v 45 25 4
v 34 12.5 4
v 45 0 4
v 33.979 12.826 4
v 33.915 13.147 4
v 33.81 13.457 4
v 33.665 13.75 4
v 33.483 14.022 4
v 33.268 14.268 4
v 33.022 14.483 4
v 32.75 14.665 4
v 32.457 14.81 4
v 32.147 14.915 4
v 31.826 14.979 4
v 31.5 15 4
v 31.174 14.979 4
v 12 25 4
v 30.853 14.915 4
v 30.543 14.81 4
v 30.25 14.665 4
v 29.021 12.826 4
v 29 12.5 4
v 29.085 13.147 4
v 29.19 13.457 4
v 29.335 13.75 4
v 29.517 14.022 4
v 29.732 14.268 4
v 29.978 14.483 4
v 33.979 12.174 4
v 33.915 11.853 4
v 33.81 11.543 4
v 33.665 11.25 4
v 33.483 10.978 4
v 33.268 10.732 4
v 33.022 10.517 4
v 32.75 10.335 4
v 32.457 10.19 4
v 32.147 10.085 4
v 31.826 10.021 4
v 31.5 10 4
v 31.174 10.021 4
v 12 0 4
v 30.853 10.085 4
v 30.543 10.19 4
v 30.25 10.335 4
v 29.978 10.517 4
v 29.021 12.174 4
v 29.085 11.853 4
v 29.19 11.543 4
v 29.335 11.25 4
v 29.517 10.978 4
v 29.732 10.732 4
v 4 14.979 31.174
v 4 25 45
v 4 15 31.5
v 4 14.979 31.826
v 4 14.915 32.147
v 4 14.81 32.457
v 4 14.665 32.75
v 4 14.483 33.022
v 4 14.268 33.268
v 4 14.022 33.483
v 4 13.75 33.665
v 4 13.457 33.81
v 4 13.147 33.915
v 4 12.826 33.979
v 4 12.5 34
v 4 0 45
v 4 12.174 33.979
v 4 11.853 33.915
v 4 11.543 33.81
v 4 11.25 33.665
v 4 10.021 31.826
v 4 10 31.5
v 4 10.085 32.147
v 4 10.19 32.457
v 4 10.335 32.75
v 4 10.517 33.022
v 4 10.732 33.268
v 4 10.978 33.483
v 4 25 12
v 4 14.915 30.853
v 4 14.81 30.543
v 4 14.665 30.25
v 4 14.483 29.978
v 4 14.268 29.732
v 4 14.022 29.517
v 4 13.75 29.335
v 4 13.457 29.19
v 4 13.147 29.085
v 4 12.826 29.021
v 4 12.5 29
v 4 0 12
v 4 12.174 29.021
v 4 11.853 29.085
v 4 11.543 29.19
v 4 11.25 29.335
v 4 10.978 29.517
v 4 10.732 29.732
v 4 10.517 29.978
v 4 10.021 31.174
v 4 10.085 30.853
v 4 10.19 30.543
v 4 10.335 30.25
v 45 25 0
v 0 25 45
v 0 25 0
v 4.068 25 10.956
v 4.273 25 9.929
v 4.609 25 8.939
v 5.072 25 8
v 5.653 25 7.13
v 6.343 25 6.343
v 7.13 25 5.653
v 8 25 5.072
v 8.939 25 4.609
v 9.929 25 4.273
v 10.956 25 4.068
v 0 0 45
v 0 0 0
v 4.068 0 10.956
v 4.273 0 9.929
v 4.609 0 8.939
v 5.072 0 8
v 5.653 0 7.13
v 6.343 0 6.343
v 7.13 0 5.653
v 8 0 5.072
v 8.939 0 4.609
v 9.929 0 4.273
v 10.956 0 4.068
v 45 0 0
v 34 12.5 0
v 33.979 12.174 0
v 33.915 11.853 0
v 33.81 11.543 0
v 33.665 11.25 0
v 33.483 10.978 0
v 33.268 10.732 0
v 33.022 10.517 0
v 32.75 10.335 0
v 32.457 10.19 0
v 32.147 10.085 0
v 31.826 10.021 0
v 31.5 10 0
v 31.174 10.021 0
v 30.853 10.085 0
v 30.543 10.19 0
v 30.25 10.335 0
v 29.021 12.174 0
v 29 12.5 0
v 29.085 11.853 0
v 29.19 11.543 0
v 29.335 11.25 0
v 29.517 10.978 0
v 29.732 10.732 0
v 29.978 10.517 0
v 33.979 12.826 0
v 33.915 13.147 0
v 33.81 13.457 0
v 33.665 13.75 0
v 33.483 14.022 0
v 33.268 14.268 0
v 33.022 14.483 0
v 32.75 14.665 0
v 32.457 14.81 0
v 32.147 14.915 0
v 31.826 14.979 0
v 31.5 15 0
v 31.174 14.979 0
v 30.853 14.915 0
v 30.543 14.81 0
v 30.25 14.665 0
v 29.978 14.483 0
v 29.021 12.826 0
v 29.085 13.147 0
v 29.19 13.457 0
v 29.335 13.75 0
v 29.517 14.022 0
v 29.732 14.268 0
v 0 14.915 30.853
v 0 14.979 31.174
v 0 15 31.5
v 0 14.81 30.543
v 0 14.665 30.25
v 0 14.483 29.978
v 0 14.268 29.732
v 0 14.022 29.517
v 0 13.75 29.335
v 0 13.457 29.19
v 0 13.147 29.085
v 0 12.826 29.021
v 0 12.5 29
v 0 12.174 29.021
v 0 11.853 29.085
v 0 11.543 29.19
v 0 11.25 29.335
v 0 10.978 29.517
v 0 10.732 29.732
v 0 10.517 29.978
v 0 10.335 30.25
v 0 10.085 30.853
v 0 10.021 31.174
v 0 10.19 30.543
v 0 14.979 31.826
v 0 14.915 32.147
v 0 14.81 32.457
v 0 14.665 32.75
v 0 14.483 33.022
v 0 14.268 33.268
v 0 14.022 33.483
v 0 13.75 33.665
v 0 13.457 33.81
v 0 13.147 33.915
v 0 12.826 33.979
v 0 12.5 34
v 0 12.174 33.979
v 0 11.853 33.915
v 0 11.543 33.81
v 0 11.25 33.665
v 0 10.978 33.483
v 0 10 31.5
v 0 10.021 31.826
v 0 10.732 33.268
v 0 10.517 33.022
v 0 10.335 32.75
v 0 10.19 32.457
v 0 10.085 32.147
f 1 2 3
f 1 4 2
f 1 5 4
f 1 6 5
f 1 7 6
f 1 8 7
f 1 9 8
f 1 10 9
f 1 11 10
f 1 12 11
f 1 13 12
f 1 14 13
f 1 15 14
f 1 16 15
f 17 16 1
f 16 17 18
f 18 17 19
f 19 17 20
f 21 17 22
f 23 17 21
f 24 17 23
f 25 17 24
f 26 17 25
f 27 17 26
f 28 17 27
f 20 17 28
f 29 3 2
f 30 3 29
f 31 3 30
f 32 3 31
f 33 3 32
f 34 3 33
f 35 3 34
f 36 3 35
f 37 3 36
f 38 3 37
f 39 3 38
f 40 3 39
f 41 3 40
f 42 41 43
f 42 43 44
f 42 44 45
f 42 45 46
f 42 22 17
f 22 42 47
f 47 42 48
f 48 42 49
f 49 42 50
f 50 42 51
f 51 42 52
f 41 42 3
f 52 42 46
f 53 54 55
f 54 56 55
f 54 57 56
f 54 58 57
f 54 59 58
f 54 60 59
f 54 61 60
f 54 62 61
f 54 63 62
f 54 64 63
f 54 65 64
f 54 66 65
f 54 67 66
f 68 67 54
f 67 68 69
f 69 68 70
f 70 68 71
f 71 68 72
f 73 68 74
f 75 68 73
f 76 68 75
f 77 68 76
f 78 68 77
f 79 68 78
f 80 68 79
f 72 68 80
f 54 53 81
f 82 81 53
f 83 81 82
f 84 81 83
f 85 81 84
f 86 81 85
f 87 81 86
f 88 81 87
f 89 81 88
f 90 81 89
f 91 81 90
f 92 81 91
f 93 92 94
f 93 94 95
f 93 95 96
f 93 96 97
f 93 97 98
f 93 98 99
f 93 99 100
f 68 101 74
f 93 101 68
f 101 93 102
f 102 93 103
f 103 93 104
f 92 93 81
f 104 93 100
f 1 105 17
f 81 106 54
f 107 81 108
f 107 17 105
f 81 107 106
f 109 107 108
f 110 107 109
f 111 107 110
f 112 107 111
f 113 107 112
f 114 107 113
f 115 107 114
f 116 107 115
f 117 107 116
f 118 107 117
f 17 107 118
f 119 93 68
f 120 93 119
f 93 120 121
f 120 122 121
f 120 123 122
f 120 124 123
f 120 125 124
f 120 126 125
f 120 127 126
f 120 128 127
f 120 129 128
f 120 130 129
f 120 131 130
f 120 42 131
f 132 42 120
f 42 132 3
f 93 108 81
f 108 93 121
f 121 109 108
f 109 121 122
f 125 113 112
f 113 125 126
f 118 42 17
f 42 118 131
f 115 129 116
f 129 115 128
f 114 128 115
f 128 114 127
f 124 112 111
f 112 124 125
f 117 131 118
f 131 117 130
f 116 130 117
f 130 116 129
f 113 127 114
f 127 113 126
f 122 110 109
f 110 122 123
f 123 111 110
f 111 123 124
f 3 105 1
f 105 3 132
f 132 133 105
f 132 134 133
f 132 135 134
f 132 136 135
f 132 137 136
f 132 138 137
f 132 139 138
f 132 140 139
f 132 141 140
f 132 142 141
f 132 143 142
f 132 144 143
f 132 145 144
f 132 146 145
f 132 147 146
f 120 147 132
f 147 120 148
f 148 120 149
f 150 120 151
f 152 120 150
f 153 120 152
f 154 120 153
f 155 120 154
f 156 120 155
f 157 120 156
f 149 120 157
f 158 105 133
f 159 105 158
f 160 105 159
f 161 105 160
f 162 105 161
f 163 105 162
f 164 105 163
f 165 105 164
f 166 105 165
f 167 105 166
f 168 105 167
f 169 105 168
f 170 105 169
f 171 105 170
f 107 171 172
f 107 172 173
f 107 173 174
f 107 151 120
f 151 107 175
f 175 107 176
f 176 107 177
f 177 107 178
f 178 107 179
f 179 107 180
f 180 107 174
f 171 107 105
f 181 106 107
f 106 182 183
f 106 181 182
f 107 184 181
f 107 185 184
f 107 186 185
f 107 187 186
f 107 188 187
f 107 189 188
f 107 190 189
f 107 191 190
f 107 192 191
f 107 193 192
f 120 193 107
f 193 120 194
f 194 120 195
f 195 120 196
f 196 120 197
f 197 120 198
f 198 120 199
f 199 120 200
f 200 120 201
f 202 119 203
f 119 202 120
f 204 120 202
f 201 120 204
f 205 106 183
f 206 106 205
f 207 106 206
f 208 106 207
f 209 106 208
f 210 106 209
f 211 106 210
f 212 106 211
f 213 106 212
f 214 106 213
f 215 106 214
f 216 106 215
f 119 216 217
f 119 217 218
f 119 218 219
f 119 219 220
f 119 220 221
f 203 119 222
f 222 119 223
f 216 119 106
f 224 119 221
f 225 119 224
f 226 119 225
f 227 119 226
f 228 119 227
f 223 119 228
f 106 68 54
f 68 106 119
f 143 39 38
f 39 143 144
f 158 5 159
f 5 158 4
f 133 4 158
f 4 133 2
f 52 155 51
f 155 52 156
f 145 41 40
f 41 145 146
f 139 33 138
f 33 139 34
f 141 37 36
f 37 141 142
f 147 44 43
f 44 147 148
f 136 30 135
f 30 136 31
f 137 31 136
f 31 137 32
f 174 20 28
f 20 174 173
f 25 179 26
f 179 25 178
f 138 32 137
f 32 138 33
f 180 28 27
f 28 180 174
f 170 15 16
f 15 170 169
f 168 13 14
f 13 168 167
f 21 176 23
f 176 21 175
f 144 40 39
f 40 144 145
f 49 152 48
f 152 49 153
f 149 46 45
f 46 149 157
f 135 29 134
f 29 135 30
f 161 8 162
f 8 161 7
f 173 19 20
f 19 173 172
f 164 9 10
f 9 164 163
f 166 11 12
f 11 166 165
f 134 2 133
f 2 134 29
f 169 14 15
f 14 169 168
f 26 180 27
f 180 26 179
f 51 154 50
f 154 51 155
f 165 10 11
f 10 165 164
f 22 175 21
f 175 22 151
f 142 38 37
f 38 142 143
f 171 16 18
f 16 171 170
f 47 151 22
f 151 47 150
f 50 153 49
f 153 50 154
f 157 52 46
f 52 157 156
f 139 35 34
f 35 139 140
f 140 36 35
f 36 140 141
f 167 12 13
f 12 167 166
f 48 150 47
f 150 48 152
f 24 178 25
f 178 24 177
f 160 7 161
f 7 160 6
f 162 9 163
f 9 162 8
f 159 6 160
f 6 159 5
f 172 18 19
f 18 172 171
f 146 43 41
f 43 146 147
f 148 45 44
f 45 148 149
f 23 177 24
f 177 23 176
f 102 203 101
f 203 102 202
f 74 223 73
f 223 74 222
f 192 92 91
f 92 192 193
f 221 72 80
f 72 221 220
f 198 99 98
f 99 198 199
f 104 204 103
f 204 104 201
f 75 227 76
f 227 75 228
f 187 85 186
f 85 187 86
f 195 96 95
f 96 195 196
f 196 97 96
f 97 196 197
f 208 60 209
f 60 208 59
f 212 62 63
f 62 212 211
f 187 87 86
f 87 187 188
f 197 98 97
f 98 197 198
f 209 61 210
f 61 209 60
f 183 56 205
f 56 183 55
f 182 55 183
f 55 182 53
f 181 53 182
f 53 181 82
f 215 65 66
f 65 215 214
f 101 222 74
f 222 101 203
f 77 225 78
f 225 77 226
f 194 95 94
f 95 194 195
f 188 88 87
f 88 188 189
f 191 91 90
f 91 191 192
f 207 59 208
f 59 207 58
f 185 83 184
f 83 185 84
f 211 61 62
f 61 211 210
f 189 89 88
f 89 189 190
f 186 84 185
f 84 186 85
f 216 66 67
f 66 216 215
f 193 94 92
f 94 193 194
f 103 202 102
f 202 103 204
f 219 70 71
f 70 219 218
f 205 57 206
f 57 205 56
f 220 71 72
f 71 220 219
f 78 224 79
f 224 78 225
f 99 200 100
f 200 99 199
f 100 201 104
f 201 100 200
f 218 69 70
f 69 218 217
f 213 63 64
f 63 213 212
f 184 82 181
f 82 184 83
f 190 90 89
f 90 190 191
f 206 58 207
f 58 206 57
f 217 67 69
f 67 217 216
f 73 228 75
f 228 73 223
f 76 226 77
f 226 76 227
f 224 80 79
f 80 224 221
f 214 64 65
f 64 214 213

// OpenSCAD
// Filleted angle bracket - a right-angle bracket with a rounded (filleted) inner corner for strength
// and a mounting hole in each leg. Teaches a fillet built as a block minus a cylinder. NOVEL part.
//
// @desc right-angle bracket with a filleted inner corner
// @prompt Design an angle bracket in OpenSCAD: two legs at a right angle, each {leg} mm long, {w} mm wide and {t} mm thick, with a {fillet} mm rounded inner corner and a {hole} mm hole in each leg. Reply with a single complete OpenSCAD file.
// @param leg    leg length, mm       [25:70]
// @param w      width, mm            [15:40]
// @param t      thickness, mm        [3:8]
// @param fillet inner fillet, mm     [3:12]
// @param hole   hole diameter, mm    [3:8]

leg    = 45;
w      = 25;
t      = 4;
fillet = 8;
hole   = 5;

$fn = 48;

difference() {
    union() {
        cube([leg, w, t]);                                     // horizontal leg
        cube([t, w, leg]);                                     // vertical leg
        translate([t, 0, t]) difference() {                    // concave fillet at the inner corner
            cube([fillet, w, fillet]);
            translate([fillet, 0, fillet]) rotate([-90, 0, 0]) cylinder(h = w, r = fillet);
        }
    }
    translate([leg * 0.7, w / 2, -1]) cylinder(h = t + 2, d = hole);                      // horizontal hole
    translate([-1, w / 2, leg * 0.7]) rotate([0, 90, 0]) cylinder(h = t + 2, d = hole);   // vertical hole
}
